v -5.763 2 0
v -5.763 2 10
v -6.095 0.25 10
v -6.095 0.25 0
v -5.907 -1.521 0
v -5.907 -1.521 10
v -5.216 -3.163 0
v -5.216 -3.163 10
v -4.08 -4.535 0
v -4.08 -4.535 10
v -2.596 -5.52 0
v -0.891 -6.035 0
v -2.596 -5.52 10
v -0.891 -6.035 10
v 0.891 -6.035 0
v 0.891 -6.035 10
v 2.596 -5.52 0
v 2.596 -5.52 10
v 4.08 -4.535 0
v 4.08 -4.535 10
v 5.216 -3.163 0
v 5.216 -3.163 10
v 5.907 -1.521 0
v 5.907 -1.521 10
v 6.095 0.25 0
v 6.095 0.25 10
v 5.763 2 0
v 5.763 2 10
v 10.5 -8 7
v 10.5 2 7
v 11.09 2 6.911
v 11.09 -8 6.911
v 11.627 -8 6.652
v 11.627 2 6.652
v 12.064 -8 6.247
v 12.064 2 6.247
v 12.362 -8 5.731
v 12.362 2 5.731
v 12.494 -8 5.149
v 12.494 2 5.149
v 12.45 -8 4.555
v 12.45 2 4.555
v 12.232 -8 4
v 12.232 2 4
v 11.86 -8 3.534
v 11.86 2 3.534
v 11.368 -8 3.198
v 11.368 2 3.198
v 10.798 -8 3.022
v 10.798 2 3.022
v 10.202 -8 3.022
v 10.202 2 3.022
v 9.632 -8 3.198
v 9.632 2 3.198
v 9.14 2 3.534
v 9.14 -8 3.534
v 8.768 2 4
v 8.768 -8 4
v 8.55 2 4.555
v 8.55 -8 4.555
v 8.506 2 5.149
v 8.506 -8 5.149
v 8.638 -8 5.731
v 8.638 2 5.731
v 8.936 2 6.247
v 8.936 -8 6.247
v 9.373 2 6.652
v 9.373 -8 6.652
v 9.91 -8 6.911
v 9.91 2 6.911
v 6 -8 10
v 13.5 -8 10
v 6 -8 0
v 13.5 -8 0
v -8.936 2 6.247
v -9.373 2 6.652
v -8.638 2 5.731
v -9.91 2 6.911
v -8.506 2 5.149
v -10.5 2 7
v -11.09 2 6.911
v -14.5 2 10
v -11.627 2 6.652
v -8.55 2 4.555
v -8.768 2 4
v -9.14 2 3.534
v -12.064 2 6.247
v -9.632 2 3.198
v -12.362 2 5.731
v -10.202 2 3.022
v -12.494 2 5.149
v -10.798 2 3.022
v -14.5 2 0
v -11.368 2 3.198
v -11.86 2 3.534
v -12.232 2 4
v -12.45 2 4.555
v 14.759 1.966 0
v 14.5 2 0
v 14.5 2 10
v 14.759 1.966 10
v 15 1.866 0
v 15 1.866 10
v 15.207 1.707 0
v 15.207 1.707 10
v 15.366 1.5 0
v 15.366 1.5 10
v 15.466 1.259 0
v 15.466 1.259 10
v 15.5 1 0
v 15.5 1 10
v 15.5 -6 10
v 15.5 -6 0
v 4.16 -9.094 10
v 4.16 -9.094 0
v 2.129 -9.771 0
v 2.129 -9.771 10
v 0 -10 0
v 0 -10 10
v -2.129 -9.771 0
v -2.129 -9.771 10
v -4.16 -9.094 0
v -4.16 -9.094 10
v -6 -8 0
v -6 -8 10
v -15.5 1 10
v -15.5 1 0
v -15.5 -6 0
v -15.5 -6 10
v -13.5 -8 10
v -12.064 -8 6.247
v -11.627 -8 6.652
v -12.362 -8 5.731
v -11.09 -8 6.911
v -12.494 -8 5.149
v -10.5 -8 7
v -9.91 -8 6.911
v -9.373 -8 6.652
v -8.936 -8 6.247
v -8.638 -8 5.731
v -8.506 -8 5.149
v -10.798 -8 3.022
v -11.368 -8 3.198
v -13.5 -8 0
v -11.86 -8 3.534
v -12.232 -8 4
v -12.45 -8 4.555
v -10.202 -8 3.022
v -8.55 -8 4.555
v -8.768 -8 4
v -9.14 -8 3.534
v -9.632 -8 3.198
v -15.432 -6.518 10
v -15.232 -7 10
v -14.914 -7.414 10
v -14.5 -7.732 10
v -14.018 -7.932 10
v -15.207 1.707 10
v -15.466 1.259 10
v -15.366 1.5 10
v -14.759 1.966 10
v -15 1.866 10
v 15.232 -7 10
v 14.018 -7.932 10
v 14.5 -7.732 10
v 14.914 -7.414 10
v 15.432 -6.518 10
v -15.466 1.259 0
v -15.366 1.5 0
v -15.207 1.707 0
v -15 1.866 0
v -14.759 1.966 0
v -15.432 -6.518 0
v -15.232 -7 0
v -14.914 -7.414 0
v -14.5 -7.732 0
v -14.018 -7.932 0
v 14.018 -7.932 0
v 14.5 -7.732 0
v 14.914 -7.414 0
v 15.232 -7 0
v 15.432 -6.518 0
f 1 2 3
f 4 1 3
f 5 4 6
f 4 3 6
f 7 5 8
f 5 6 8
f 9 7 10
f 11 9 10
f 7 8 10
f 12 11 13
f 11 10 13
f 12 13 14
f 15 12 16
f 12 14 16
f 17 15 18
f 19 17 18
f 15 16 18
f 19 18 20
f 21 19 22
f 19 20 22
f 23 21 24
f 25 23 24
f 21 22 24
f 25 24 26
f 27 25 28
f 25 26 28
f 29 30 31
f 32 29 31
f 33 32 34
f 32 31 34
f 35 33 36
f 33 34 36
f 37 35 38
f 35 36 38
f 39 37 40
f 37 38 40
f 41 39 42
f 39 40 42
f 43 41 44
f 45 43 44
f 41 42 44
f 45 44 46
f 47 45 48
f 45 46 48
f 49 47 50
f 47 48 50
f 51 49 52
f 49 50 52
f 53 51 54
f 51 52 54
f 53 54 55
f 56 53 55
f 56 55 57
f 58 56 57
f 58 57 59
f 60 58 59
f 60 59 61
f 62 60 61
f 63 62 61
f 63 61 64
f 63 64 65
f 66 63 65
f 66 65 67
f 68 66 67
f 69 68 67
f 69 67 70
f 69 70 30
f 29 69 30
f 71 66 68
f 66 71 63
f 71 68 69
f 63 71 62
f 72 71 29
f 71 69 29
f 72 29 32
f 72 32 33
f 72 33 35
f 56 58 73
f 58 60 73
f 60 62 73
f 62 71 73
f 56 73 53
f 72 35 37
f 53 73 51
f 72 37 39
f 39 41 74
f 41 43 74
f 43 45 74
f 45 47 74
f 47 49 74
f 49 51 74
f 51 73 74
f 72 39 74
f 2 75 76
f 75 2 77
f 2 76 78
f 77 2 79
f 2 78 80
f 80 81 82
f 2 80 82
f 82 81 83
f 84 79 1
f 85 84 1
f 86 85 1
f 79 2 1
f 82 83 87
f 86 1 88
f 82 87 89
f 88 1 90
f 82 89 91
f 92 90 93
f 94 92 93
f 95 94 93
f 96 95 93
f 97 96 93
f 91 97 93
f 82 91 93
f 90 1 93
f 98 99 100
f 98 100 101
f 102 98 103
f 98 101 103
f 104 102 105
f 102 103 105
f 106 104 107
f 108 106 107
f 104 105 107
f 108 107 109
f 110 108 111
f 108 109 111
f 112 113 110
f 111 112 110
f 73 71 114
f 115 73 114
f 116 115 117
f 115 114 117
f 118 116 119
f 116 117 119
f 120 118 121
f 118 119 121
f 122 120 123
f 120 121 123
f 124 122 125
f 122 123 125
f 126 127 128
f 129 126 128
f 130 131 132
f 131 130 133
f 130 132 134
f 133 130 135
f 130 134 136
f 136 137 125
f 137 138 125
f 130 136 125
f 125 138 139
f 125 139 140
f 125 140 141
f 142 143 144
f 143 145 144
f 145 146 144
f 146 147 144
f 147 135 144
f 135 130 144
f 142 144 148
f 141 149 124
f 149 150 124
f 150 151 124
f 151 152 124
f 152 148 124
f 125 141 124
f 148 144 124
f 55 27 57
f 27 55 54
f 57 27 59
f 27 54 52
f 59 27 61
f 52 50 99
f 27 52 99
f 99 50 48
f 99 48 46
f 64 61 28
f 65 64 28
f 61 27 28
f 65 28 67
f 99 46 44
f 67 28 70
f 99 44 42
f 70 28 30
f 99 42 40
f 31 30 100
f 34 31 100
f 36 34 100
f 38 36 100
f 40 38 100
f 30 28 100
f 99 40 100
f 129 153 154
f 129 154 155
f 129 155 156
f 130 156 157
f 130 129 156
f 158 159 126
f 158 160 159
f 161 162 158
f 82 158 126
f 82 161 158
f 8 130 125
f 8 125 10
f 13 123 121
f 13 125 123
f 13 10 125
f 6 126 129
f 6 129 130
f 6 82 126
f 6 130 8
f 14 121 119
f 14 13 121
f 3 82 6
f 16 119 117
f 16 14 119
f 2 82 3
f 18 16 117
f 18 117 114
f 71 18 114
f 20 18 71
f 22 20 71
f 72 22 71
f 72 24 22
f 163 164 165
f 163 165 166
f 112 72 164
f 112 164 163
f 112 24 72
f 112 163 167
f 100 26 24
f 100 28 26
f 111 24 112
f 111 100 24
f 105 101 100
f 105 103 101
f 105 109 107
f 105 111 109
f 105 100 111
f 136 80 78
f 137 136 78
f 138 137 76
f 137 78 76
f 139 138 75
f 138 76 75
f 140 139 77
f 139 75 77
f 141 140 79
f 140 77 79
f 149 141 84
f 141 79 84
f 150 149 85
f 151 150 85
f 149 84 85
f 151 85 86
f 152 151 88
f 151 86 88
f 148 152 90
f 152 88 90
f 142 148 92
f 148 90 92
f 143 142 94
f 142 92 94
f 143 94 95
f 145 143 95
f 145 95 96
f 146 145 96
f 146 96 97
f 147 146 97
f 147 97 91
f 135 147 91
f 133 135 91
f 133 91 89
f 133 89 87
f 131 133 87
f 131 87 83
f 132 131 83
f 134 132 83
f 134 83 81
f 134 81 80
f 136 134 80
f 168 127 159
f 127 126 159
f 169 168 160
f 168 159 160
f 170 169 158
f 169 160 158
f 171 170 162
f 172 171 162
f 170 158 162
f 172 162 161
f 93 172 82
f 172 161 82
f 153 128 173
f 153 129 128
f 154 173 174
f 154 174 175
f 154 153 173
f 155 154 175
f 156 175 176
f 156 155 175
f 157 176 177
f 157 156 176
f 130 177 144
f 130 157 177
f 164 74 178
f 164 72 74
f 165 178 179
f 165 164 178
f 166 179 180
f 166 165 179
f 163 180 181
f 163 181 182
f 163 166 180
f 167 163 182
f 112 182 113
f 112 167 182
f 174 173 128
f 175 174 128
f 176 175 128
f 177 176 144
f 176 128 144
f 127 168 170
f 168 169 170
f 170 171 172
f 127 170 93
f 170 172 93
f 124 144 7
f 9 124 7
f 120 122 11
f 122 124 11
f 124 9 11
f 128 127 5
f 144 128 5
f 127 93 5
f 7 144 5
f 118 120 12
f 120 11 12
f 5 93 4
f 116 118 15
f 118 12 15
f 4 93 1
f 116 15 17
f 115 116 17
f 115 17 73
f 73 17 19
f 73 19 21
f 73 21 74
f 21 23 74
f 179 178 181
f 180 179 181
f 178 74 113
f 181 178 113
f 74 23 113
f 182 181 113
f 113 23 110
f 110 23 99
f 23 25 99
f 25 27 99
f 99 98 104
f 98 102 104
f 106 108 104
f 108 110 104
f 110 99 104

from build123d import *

# Parameters (mm, degrees)
SKETCH_1_R          = 15
EXTRUDE_1_DEPTH     = 10
CUT_EXTRUDE_1_DEPTH = 10
SKETCH_5_R          = 2
CUT_EXTRUDE_2_DEPTH = 25.779023387
SKETCH_7_W          = 30.648506912
SKETCH_7_H          = 10.688803122
CUT_EXTRUDE_4_DEPTH = 24.45207897
EXTRUDE_START       = -10
EXTRUDE_2_DEPTH     = 10
EXTRUDE_3_DEPTH     = 10
FILLET_1_R          = 2
FILLET_2_R          = 1


with BuildPart() as part:
    # ｽｹｯﾁ1 → ﾎﾞｽ - 押し出し1 (new body)
    with BuildSketch(Plane.XY):
        Circle(SKETCH_1_R)
    extrude(amount=EXTRUDE_1_DEPTH)

    # ｽｹｯﾁ2 → ｶｯﾄ - 押し出し1 (cut)
    with BuildSketch(Plane.XY.offset(10)):
        with BuildLine():
            Line((5.762811814, 2), (20.145888179, 2))
            Line((20.145888179, 2), (20.145888179, 26.748934653))
            Line((20.145888179, 26.748934653), (-19.854111821, 26.748934653))
            Line((-19.854111821, 26.748934653), (-19.854111821, 2))
            Line((-19.854111821, 2), (-5.762811814, 2))
            ThreePointArc((-5.762811814, 2), (0, -6.1), (5.762811814, 2))
        make_face()
    extrude(amount=-CUT_EXTRUDE_1_DEPTH, mode=Mode.SUBTRACT)

    # ｽｹｯﾁ5 → ｶｯﾄ - 押し出し2 (cut, through all)
    with BuildSketch(Plane(origin=(0, 2, 0), x_dir=(1, 0, 0), z_dir=(0, 1, 0))):
        with Locations(Location((-10.5, -5, 0), (0, 0, 270))):
            Circle(SKETCH_5_R)
        with Locations(Location((10.5, -5, 0), (0, 0, 270))):
            Circle(SKETCH_5_R)
    extrude(amount=-CUT_EXTRUDE_2_DEPTH, mode=Mode.SUBTRACT)

    # ｽｹｯﾁ7 → ｶｯﾄ - 押し出し4 (cut, through all)
    with BuildSketch(Plane.XY.offset(10)):
        with Locations((0, -13.344401561)):
            Rectangle(SKETCH_7_W, SKETCH_7_H)
    extrude(amount=-CUT_EXTRUDE_4_DEPTH, mode=Mode.SUBTRACT)

    # ｽｹｯﾁ8 → ﾎﾞｽ - 押し出し2 (add)
    with BuildSketch(Plane.XY.offset(10).offset(EXTRUDE_START)):
        with BuildLine():
            Line((-14.866068747, 2), (-15.5, 2))
            Line((-15.5, 2), (-15.5, -8))
            Line((-15.5, -8), (-12.68857754, -8))
            ThreePointArc((-12.68857754, -8), (-14.656555974, -3.191452176), (-14.866068747, 2))
        make_face()
        with BuildLine():
            ThreePointArc((14.866068747, 2), (14.656555974, -3.191452176), (12.68857754, -8))
            Line((12.68857754, -8), (15.5, -8))
            Line((15.5, -8), (15.5, 2))
            Line((15.5, 2), (14.866068747, 2))
        make_face()
    extrude(amount=EXTRUDE_2_DEPTH)

    # ｽｹｯﾁ9 → ﾎﾞｽ - 押し出し3 (add)
    with BuildSketch(Plane.XY.offset(10)):
        with BuildLine():
            Line((-6, -8), (6, -8))
            ThreePointArc((6, -8), (0, -10), (-6, -8))
        make_face()
    extrude(amount=-EXTRUDE_3_DEPTH)

    # ﾌｨﾚｯﾄ1
    fillet_1_edges = [part.edges().sort_by_distance(p)[0] for p in [
        (-15.5, -8, 5),
        (15.5, -8, 5),
    ]]
    fillet(fillet_1_edges, radius=FILLET_1_R)

    # ﾌｨﾚｯﾄ2
    fillet_2_edges = [part.edges().sort_by_distance(p)[0] for p in [
        (-15.5, 2, 5),
        (15.5, 2, 5),
    ]]
    fillet(fillet_2_edges, radius=FILLET_2_R)


solid = part.part
